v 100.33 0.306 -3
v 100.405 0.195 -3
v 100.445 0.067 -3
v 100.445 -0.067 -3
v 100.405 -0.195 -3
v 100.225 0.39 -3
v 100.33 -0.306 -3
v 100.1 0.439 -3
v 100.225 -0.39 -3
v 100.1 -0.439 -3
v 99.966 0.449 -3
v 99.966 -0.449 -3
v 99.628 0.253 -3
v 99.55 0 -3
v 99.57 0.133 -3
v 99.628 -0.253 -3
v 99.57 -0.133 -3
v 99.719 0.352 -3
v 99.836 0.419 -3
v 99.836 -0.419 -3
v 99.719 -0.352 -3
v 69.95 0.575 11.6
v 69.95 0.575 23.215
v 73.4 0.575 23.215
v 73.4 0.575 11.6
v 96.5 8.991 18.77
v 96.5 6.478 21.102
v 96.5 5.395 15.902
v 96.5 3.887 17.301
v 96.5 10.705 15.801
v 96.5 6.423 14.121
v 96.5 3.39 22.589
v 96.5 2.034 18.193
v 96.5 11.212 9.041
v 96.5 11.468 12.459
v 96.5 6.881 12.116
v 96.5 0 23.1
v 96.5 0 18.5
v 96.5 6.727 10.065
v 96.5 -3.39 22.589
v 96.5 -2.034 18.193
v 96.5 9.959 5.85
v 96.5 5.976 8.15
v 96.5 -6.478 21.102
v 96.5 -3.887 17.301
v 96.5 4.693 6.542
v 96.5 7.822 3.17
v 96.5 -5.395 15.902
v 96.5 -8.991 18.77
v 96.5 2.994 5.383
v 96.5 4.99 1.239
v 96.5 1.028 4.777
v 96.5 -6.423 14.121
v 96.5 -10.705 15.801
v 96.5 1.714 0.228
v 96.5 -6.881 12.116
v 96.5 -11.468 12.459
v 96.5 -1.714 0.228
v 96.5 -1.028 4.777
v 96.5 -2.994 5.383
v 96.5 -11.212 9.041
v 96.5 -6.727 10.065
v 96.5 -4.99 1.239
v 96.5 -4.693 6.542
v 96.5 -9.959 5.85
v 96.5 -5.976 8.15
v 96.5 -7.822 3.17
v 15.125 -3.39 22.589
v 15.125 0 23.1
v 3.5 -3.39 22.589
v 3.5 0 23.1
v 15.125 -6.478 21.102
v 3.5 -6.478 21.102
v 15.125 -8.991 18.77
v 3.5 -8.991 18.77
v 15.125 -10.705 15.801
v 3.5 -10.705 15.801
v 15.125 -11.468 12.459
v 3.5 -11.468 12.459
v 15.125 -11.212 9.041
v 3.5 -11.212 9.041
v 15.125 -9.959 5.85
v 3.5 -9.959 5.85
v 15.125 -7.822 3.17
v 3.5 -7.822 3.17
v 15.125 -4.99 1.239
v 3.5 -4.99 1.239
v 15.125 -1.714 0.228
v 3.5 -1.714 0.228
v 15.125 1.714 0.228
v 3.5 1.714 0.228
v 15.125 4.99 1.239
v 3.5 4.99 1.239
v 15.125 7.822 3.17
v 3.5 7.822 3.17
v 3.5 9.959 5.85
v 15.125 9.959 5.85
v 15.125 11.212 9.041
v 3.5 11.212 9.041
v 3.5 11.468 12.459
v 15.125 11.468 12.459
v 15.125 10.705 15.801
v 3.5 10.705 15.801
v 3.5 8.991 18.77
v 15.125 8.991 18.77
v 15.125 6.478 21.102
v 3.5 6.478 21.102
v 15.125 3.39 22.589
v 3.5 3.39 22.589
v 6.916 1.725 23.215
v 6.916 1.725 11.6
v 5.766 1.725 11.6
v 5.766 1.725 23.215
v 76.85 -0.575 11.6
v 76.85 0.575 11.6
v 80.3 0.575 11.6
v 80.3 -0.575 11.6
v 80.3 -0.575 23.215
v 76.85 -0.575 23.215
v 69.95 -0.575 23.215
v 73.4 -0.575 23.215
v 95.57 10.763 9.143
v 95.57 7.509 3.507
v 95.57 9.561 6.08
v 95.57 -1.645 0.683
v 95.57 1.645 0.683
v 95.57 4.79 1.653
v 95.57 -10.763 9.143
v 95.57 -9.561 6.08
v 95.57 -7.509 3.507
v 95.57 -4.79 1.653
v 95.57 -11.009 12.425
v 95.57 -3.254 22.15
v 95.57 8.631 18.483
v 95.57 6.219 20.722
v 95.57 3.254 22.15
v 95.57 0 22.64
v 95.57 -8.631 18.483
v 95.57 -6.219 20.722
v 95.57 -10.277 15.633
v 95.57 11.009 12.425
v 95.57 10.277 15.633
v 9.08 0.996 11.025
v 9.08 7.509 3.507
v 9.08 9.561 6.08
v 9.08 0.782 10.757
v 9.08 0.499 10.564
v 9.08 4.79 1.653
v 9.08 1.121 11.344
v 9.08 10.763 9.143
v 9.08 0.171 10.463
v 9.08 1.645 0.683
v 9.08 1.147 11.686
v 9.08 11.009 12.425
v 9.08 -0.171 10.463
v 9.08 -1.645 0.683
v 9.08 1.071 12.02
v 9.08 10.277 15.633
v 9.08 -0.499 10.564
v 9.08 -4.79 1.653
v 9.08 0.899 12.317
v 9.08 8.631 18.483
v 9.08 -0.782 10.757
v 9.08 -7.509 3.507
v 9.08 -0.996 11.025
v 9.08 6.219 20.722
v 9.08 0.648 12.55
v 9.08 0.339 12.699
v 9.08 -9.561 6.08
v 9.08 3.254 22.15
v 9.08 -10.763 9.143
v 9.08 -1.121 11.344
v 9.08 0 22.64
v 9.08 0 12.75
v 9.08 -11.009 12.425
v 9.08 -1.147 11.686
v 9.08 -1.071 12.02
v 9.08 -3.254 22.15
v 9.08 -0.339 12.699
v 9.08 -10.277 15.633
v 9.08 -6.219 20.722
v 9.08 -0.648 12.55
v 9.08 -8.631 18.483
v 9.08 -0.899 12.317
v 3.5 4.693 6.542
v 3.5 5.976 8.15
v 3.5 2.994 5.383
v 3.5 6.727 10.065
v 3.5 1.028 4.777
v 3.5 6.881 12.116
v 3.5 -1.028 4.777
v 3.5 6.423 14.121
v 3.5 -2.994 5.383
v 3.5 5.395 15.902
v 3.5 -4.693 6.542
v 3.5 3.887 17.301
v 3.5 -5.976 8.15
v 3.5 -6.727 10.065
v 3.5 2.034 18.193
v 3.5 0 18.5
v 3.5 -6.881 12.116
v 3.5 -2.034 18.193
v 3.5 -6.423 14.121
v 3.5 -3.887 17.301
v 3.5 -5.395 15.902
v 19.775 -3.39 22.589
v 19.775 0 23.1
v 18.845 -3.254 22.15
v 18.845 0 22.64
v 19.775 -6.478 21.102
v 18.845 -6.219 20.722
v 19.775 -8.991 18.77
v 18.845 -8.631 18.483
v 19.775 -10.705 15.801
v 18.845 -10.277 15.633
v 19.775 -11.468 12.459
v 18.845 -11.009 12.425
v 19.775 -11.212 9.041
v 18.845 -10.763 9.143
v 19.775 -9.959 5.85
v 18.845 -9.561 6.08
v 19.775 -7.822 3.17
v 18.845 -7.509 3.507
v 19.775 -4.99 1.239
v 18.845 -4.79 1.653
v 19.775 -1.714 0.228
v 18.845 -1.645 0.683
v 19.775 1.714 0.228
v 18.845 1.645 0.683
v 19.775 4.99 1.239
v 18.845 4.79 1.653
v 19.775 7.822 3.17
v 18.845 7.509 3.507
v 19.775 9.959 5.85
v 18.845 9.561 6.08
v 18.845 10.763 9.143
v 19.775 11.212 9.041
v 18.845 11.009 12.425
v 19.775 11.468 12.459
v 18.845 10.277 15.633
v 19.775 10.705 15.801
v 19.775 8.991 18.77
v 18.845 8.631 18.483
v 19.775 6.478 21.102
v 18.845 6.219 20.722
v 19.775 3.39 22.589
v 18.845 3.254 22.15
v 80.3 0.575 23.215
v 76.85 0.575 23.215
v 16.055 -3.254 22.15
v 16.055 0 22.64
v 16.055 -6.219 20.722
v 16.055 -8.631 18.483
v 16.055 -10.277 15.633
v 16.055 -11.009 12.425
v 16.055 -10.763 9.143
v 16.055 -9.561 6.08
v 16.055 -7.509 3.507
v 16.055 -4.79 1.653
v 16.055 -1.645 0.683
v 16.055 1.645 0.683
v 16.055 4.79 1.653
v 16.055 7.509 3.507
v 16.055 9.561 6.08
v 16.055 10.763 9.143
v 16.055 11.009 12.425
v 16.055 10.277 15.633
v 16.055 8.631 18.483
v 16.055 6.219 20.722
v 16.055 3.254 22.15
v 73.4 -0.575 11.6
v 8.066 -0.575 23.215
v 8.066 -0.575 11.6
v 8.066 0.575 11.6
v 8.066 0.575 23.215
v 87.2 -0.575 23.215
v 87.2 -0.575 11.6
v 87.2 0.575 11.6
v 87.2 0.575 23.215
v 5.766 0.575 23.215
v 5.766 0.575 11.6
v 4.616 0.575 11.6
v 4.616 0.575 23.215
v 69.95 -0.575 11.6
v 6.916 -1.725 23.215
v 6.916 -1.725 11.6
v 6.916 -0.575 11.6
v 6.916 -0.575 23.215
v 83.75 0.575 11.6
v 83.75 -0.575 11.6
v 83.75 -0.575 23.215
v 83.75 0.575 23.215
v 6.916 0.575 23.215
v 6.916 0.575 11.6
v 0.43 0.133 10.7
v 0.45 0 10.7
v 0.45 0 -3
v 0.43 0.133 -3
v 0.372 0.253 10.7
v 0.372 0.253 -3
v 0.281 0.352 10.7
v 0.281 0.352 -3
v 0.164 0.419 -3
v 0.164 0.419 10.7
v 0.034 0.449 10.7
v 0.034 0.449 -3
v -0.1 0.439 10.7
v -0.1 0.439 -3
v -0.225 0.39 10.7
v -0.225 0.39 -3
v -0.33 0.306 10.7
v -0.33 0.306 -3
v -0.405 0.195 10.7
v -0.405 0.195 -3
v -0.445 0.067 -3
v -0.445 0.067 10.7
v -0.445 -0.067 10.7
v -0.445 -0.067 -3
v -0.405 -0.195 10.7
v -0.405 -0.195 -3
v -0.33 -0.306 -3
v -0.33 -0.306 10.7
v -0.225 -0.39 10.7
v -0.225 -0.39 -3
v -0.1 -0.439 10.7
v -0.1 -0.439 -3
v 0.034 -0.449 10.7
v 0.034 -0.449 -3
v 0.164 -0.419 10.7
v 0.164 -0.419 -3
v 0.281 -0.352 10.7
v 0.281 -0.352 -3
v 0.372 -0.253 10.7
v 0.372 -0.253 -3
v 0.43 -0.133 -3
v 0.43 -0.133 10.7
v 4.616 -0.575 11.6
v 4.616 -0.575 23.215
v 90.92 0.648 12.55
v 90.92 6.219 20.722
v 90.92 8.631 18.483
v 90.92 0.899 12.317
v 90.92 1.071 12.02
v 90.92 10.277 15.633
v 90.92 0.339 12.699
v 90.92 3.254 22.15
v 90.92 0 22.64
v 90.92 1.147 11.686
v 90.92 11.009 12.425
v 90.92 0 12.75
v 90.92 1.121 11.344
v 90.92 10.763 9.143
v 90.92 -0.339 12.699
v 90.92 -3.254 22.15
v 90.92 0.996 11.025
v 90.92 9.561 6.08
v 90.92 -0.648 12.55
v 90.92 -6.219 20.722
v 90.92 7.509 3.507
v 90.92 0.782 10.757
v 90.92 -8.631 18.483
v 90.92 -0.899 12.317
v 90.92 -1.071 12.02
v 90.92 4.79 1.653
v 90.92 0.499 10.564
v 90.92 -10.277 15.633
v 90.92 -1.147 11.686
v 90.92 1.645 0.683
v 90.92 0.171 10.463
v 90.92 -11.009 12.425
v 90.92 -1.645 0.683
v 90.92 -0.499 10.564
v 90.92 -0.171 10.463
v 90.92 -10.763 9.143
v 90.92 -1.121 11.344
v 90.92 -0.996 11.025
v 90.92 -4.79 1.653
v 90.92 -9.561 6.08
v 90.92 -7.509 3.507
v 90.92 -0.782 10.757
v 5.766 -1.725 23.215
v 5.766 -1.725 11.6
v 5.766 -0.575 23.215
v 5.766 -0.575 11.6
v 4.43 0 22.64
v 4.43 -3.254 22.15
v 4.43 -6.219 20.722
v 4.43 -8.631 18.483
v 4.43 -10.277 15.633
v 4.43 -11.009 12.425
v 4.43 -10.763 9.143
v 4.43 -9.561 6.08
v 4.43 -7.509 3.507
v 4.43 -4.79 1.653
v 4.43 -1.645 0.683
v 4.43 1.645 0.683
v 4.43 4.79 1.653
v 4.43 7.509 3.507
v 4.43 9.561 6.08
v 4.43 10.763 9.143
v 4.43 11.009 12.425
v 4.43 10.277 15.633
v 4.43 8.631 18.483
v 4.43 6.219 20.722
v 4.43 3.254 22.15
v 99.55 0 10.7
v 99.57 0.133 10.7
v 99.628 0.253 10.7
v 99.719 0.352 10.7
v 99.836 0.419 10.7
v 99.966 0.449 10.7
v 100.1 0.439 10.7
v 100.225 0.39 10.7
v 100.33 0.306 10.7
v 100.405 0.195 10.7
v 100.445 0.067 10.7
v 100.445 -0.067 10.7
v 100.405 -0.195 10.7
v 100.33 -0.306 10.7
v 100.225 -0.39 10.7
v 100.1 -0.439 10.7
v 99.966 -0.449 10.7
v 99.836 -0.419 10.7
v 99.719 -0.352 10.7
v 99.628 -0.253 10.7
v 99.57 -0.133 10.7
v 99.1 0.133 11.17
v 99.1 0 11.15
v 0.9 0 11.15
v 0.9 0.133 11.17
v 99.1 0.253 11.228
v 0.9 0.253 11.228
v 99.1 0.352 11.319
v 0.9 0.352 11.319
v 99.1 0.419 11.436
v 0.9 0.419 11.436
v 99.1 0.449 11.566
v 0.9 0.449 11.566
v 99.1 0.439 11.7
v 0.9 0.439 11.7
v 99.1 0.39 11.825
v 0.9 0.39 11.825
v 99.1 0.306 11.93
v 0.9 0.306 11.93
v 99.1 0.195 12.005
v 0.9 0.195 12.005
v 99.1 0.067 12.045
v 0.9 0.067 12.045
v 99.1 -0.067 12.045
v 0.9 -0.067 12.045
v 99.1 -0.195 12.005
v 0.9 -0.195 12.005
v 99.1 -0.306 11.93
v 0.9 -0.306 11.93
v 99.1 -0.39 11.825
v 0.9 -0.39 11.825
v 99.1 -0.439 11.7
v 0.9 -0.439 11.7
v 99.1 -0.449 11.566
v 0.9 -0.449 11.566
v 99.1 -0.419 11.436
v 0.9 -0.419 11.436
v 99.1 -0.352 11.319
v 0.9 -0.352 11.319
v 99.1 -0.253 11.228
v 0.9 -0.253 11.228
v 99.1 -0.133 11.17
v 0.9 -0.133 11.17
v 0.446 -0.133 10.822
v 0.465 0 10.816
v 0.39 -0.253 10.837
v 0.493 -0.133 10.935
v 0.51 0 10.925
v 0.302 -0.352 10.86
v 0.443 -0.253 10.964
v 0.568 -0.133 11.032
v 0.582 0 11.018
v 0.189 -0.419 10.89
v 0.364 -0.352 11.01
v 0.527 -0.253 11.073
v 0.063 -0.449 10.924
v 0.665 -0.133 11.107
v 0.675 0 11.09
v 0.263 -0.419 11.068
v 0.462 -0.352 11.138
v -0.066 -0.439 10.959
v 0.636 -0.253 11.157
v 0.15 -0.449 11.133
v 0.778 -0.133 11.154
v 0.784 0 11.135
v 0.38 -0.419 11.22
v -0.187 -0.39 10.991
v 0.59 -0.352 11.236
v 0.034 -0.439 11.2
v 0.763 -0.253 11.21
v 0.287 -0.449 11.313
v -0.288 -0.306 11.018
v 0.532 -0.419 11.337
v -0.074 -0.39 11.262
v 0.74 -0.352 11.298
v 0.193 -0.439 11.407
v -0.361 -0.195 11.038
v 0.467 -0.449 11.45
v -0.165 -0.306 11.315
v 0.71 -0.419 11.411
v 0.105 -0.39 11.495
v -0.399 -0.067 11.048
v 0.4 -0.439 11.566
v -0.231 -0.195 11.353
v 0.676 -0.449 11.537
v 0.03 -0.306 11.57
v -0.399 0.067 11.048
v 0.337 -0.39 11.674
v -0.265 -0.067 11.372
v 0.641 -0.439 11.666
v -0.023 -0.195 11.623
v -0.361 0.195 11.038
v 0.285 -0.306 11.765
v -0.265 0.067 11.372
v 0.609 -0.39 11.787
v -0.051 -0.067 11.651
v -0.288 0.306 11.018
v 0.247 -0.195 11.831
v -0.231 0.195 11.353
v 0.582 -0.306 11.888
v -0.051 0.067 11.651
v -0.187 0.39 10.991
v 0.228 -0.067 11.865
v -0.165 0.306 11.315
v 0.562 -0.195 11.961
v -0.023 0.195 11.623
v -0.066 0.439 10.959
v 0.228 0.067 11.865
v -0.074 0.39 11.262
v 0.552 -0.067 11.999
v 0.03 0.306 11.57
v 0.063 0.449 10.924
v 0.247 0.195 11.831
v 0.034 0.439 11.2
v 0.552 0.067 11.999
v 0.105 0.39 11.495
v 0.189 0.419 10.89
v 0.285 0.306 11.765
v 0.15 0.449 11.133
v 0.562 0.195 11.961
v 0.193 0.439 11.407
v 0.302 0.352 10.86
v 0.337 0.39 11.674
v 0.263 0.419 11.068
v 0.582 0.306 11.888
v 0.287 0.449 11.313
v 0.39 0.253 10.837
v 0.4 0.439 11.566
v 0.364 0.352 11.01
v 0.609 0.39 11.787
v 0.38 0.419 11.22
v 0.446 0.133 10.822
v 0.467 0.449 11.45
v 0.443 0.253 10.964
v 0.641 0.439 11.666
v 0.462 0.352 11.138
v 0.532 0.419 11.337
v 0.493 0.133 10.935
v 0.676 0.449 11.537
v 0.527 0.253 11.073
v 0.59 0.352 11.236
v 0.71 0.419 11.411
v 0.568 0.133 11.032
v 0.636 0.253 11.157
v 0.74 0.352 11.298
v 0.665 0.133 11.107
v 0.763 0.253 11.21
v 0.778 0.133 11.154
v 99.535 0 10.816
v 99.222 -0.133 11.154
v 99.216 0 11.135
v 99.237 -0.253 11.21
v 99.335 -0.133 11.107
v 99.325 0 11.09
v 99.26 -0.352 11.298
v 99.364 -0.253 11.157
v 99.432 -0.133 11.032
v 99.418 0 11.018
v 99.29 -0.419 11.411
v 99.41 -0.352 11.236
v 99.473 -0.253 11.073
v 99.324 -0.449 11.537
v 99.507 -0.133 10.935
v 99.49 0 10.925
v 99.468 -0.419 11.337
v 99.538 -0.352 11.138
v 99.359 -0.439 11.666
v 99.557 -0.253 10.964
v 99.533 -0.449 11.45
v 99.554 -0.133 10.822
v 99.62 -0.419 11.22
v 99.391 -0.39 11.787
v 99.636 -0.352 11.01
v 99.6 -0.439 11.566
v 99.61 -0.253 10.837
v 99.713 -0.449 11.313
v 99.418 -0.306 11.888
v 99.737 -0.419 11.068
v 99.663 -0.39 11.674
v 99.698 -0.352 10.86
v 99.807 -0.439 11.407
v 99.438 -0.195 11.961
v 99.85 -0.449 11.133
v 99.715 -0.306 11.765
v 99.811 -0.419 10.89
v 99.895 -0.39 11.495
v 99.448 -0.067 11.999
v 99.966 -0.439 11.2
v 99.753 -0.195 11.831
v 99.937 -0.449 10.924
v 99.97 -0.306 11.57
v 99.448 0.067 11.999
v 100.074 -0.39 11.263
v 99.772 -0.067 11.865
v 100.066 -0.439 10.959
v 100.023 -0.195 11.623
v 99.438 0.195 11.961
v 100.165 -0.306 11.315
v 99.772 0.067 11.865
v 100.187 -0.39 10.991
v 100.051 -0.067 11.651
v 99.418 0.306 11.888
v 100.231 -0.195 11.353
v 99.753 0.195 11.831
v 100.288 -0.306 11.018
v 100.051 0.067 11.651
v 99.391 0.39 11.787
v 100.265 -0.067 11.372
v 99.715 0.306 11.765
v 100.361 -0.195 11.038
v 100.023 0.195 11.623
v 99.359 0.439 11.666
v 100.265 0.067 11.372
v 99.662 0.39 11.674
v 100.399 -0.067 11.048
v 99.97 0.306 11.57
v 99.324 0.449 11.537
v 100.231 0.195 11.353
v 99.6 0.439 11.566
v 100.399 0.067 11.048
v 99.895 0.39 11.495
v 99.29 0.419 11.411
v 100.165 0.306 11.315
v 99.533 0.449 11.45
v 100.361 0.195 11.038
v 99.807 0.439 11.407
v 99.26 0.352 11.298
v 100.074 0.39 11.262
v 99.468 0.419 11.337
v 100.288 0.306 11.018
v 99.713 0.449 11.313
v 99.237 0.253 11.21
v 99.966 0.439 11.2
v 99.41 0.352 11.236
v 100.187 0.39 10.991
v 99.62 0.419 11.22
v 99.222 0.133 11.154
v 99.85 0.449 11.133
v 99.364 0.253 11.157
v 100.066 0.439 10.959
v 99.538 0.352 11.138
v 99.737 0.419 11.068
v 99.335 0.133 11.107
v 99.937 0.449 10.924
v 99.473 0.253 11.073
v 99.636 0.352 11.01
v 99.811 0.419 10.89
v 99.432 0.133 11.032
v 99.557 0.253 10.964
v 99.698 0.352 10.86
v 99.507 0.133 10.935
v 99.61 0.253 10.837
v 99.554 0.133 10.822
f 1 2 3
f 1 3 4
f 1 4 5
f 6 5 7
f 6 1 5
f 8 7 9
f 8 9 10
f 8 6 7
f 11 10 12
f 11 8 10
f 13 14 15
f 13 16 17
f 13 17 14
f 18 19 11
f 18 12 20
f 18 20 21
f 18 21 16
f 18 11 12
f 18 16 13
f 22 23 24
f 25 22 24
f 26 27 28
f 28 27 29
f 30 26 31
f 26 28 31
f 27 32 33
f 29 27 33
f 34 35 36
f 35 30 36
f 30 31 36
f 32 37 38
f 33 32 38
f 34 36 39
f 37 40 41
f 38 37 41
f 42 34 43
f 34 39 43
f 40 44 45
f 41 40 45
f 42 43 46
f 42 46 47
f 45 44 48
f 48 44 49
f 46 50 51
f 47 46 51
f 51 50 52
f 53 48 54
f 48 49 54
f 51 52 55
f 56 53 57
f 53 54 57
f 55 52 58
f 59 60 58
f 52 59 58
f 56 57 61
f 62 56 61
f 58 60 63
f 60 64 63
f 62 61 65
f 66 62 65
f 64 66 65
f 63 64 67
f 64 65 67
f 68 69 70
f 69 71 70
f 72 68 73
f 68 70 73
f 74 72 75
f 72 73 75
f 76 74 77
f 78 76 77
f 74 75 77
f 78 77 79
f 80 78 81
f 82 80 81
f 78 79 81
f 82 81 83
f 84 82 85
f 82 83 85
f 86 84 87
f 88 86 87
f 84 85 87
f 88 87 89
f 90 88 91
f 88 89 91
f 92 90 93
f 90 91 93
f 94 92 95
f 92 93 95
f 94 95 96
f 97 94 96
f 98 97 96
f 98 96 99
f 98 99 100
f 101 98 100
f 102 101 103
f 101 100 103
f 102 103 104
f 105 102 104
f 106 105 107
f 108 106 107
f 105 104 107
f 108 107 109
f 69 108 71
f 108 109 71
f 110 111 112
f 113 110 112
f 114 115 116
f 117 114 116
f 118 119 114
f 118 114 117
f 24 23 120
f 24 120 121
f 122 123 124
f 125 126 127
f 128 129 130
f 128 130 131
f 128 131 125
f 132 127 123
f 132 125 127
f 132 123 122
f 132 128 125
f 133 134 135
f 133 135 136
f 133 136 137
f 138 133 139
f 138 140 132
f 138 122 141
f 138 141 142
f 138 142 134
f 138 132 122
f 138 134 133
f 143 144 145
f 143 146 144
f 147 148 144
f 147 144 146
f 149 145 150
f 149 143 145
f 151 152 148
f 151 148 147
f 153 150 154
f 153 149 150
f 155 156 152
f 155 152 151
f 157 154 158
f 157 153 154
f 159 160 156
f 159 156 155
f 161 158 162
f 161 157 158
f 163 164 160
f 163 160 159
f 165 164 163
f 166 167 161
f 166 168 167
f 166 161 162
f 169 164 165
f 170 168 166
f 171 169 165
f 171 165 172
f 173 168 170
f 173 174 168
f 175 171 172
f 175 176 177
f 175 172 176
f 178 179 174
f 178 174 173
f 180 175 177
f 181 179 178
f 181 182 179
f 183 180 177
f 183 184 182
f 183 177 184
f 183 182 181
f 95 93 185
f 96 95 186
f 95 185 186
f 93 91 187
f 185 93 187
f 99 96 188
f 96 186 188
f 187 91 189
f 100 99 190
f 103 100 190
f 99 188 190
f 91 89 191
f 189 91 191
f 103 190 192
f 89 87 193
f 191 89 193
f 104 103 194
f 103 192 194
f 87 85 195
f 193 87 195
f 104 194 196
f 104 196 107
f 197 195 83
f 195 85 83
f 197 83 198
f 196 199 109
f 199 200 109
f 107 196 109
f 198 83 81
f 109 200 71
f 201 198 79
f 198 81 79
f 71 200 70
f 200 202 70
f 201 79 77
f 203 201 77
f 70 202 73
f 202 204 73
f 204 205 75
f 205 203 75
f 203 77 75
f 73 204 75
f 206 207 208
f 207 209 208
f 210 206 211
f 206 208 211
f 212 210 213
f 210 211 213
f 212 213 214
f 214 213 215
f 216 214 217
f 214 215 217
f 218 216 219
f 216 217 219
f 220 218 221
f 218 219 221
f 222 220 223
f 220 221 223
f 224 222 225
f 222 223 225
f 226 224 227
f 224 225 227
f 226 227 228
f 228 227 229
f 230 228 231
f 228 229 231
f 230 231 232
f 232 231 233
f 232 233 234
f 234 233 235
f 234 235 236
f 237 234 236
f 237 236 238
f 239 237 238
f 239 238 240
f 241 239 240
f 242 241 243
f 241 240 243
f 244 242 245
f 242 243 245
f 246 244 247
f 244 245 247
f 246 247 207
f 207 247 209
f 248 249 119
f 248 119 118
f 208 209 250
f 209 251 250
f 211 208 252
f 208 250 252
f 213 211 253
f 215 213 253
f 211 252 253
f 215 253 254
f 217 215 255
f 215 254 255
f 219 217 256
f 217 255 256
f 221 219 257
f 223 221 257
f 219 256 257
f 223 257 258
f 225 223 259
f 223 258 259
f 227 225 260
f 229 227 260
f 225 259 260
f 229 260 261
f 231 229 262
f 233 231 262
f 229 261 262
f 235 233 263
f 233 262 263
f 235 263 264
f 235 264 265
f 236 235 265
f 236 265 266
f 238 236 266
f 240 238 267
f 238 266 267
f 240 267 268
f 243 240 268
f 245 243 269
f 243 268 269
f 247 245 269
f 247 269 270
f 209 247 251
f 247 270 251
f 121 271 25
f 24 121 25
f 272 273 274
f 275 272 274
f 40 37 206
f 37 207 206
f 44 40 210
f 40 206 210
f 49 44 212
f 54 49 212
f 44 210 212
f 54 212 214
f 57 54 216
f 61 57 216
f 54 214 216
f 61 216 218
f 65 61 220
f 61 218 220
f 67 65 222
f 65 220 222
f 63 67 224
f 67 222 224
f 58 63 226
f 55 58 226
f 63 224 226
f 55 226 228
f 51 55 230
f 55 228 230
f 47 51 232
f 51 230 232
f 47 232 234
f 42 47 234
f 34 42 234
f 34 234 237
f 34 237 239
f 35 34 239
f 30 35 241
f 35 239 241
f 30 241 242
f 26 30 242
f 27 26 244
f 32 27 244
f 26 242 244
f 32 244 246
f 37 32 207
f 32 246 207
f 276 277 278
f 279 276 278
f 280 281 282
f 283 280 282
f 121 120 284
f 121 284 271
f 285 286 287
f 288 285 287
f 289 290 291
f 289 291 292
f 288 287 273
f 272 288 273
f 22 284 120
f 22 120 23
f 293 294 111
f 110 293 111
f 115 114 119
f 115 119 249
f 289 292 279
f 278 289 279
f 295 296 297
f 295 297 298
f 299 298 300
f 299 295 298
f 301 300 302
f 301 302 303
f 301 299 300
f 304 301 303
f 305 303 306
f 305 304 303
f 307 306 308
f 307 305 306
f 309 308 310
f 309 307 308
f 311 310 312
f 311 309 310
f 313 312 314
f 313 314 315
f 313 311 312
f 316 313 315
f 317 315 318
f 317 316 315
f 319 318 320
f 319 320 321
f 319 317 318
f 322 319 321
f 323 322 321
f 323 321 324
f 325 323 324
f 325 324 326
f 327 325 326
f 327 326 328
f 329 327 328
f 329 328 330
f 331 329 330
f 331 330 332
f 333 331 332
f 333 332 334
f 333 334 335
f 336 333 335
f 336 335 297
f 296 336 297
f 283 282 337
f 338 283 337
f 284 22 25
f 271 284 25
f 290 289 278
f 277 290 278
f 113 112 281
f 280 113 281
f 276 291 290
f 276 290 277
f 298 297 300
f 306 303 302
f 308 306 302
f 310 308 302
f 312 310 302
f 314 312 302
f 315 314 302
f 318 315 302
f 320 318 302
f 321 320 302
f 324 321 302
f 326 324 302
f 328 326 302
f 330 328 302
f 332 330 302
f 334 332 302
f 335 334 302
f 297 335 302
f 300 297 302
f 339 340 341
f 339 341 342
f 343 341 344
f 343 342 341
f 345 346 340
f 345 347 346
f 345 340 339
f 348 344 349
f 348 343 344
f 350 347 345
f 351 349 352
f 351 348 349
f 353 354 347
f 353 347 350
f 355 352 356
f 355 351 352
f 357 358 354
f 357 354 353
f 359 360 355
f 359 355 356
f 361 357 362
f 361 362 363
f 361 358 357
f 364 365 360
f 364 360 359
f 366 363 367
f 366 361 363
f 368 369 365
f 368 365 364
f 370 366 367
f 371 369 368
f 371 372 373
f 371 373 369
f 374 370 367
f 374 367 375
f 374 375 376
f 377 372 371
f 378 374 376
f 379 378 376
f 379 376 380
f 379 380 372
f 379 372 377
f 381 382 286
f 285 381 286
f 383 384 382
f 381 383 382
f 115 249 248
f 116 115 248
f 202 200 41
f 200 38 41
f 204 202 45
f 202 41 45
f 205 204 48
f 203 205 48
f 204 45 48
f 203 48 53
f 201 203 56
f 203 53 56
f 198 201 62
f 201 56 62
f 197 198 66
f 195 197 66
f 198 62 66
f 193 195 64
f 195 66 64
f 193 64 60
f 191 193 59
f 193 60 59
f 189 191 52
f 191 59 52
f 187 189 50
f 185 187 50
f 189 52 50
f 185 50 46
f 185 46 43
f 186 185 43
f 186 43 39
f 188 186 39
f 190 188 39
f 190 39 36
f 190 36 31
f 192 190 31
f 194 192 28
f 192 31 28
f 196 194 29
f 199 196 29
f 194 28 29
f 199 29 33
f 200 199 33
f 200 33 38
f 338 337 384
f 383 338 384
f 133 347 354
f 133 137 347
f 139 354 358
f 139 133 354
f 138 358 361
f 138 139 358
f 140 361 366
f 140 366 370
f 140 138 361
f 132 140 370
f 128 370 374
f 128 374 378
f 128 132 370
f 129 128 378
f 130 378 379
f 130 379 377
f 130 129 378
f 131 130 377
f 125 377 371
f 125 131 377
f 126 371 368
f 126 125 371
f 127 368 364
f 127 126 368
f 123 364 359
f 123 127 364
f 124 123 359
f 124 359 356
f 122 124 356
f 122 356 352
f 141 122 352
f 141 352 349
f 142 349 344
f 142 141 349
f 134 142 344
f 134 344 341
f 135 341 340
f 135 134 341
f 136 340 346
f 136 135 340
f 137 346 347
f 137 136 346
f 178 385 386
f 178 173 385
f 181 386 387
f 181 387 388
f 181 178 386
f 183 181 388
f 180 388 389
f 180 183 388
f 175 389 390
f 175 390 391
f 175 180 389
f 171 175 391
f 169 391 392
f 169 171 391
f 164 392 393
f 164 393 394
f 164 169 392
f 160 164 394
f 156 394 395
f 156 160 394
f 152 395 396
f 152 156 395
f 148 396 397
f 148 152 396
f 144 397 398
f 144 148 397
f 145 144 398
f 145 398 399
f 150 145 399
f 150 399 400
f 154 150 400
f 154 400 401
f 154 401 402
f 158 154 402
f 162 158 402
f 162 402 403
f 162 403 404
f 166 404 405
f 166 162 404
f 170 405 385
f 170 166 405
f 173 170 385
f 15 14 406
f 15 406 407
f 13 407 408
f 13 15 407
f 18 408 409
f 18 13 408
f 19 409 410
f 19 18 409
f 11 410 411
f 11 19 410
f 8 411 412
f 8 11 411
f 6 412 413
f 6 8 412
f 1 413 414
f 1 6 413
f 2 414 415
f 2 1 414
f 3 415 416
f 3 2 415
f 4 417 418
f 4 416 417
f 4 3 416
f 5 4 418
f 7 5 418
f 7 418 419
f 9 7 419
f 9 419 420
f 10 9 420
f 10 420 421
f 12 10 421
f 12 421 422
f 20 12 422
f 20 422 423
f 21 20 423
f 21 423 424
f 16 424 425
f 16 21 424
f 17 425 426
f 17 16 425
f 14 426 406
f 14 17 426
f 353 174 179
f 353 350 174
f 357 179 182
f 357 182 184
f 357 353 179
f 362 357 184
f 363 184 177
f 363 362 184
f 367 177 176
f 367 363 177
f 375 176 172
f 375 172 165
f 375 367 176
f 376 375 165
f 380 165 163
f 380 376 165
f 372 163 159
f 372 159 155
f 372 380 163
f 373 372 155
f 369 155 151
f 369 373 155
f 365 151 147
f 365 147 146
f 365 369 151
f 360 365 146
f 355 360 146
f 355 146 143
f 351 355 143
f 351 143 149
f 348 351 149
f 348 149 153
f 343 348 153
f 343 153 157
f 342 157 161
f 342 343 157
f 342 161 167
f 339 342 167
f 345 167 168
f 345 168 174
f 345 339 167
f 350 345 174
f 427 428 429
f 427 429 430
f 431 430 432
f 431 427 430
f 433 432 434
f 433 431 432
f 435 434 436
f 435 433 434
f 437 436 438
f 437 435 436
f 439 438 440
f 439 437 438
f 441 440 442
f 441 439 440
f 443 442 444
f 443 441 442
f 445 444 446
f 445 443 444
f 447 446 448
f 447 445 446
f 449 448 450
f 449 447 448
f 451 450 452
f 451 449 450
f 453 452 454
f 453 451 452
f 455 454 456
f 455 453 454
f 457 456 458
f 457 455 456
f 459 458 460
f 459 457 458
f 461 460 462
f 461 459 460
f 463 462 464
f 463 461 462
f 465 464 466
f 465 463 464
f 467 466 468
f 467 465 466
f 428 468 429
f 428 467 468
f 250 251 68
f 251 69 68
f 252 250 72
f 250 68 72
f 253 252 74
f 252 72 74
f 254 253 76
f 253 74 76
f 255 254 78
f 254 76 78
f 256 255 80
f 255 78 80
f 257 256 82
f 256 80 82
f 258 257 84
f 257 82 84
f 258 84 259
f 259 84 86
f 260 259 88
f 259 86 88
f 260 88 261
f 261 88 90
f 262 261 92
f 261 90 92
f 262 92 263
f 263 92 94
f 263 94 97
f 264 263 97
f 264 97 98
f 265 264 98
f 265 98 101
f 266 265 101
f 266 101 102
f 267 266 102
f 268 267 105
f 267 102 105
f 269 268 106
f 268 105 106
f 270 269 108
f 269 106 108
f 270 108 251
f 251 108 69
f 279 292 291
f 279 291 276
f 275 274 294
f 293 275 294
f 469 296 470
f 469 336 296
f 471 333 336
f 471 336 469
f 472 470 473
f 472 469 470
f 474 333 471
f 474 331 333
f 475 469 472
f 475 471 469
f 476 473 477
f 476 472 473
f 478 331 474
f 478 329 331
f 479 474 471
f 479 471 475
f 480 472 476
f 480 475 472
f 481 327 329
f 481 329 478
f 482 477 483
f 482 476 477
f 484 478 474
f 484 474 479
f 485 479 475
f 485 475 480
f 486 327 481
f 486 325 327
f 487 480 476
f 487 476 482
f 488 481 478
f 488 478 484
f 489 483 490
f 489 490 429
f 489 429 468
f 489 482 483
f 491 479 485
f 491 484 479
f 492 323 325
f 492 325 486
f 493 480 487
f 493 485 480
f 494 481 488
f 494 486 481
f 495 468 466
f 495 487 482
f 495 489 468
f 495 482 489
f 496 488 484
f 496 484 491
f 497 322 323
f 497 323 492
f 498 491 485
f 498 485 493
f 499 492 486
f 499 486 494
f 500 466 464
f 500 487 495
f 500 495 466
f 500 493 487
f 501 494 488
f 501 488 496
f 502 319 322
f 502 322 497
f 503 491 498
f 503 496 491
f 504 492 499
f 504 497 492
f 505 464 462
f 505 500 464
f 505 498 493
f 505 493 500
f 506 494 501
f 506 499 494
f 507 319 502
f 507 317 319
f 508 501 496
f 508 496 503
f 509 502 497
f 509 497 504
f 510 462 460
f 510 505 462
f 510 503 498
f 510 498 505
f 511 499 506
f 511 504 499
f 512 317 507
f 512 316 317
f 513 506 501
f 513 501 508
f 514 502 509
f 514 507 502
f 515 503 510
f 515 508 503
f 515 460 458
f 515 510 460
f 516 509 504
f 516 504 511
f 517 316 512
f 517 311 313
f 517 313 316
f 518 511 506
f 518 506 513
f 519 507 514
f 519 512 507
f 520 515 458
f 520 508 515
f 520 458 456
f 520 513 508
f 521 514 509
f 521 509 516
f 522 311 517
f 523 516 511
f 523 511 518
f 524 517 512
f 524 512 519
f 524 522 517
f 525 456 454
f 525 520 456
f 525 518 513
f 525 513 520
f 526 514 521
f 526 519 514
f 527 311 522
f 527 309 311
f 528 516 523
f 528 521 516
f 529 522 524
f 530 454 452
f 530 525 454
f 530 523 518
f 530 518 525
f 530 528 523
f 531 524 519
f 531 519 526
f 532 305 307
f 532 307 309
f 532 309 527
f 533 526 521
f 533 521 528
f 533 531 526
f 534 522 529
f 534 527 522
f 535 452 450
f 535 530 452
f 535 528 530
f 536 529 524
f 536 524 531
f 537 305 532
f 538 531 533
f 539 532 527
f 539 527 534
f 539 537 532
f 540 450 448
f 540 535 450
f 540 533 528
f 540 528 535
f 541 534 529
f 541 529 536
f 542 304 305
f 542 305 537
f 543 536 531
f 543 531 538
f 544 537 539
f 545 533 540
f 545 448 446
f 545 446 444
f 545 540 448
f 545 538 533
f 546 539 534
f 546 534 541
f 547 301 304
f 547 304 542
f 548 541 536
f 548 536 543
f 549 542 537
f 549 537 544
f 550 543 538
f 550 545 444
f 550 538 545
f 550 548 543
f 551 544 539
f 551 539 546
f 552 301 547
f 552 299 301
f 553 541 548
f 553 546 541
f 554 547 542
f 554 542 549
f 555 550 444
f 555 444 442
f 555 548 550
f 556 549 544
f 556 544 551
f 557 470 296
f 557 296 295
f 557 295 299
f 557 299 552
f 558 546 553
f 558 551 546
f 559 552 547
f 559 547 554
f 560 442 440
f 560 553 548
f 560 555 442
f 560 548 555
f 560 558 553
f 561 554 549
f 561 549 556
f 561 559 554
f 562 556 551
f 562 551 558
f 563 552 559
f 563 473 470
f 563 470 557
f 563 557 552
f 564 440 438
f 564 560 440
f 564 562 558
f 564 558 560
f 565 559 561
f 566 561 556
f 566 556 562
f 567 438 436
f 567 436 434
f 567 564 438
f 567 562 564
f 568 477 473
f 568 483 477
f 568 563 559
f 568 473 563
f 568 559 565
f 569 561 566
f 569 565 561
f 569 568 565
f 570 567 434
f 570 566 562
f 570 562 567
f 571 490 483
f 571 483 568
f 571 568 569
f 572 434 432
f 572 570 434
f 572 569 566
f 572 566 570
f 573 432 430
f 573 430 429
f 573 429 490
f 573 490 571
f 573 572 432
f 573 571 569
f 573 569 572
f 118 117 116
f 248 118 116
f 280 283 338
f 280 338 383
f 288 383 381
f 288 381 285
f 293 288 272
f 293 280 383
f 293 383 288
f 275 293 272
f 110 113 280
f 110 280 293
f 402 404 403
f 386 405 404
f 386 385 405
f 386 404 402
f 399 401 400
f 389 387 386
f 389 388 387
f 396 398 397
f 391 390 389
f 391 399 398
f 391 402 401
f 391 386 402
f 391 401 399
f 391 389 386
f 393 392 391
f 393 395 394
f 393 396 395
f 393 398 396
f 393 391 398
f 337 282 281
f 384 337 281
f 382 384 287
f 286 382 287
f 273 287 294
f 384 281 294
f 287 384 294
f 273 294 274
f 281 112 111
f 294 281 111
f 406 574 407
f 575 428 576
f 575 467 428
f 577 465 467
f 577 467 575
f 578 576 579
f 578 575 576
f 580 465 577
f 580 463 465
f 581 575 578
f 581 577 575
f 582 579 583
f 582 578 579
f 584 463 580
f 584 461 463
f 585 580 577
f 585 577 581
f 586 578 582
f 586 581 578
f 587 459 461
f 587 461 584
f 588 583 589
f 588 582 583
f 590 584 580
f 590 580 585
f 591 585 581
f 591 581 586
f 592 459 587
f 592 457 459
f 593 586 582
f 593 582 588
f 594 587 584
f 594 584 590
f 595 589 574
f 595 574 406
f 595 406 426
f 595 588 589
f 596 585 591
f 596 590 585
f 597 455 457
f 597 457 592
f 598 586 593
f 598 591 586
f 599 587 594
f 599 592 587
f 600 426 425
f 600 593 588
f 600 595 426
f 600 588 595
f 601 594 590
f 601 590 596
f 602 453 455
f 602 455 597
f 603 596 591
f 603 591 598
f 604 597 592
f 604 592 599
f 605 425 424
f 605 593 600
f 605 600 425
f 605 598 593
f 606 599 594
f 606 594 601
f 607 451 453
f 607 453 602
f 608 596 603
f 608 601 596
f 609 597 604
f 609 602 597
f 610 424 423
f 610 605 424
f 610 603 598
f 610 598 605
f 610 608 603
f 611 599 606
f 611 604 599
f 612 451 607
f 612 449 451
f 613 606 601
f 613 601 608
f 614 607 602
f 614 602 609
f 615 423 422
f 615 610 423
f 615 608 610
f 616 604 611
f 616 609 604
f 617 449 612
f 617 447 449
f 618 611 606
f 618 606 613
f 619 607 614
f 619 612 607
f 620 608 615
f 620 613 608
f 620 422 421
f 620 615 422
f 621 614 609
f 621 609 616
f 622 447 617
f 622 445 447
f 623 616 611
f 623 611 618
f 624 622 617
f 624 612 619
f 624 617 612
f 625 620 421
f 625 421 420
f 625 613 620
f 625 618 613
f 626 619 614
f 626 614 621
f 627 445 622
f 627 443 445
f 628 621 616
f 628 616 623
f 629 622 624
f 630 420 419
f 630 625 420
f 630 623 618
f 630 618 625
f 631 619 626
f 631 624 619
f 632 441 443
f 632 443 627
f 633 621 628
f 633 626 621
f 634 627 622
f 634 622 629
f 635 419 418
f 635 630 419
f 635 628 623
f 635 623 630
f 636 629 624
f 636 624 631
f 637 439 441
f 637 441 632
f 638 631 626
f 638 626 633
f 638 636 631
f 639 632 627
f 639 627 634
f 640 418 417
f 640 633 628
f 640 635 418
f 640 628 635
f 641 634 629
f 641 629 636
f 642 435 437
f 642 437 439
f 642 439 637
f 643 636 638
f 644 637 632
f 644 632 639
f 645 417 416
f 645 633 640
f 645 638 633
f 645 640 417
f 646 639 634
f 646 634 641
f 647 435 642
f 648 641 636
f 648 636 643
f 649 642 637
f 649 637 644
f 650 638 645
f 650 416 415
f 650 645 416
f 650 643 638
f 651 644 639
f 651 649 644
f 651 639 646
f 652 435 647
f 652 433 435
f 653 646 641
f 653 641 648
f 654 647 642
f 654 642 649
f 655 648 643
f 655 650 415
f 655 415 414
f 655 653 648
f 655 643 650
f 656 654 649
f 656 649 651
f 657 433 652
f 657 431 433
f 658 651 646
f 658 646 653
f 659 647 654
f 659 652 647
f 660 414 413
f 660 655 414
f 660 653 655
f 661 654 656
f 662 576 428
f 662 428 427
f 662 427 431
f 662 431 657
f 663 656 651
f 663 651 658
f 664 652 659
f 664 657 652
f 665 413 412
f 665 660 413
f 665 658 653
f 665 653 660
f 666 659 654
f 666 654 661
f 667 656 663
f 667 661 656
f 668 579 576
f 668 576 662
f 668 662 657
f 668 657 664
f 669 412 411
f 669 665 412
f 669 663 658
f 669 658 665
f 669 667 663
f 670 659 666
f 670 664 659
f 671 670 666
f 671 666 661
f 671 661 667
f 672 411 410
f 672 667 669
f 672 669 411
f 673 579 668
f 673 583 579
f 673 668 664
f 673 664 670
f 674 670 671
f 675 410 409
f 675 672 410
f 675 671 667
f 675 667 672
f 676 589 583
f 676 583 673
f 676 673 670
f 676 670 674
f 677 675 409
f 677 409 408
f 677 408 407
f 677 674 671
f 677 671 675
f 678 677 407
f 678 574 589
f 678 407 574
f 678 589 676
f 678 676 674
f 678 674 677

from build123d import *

# Parameters (mm, degrees)
SKETCH_R    = 0.45
SKETCH004_W = 3.45
SKETCH004_H = 1.15
PAD_DEPTH   = 11.615


with BuildPart() as sweep_body:
    # Sweep: sweep along a path in Sketch001
    with BuildLine(Plane.XZ) as sweep_path:
        Line((0, -3), (0, 10.7))
        ThreePointArc((0, 10.7), (0.263601, 11.336393), (0.899993, 11.6))
        Line((0.899993, 11.6), (99.1, 11.6))
        ThreePointArc((99.1, 11.6), (99.736396, 11.336396), (100, 10.7))
        Line((100, 10.7), (100, -3))
    # Sketch → Sweep (sweep)
    with BuildSketch(Plane.XY.offset(-2)):
        Circle(SKETCH_R)
    sweep(path=sweep_path.line)


with BuildPart() as revolution:
    # Sketch002 → Revolution (revolve)
    with BuildSketch(Plane.XZ):
        Polygon((3.5, 23.1), (3.5, 18.5), (96.5, 18.5), (96.5, 23.1), (19.775, 23.1), (18.845, 22.64), (16.055, 22.64), (15.125, 23.1), align=None)
    revolve(axis=Axis((6.97588, 0, 11.6), (1, 0, 0)))


with BuildPart() as revolution001:
    # Sketch003 → Revolution001 (revolve)
    with BuildSketch(Plane.XZ):
        Polygon((4.43, 22.64), (9.08, 22.64), (9.08, 12.75), (90.92, 12.75), (90.92, 22.64), (95.57, 22.64), (95.57, 11.6), (4.43, 11.6), align=None)
    revolve(axis=Axis((6.97588, 0, 11.6), (1, 0, 0)))


with BuildPart() as pad:
    # Sketch004 → Pad (new body)
    with BuildSketch(Plane.XY.offset(11.6)):
        with Locations((85.475, 0)):
            Rectangle(SKETCH004_W, SKETCH004_H)
        with Locations((78.575, 0)):
            Rectangle(SKETCH004_W, SKETCH004_H)
        with Locations((71.675, 0)):
            Rectangle(SKETCH004_W, SKETCH004_H)
        Polygon((5.766, 0.575), (4.616, 0.575), (4.616, -0.575), (5.766, -0.575), (5.766, -1.725), (6.916, -1.725), (6.916, -0.575), (8.066, -0.575), (8.066, 0.575), (6.916, 0.575), (6.916, 1.725), (5.766, 1.725), align=None)
    extrude(amount=PAD_DEPTH)


solid = Compound([sweep_body.part, revolution.part, revolution001.part, pad.part])
